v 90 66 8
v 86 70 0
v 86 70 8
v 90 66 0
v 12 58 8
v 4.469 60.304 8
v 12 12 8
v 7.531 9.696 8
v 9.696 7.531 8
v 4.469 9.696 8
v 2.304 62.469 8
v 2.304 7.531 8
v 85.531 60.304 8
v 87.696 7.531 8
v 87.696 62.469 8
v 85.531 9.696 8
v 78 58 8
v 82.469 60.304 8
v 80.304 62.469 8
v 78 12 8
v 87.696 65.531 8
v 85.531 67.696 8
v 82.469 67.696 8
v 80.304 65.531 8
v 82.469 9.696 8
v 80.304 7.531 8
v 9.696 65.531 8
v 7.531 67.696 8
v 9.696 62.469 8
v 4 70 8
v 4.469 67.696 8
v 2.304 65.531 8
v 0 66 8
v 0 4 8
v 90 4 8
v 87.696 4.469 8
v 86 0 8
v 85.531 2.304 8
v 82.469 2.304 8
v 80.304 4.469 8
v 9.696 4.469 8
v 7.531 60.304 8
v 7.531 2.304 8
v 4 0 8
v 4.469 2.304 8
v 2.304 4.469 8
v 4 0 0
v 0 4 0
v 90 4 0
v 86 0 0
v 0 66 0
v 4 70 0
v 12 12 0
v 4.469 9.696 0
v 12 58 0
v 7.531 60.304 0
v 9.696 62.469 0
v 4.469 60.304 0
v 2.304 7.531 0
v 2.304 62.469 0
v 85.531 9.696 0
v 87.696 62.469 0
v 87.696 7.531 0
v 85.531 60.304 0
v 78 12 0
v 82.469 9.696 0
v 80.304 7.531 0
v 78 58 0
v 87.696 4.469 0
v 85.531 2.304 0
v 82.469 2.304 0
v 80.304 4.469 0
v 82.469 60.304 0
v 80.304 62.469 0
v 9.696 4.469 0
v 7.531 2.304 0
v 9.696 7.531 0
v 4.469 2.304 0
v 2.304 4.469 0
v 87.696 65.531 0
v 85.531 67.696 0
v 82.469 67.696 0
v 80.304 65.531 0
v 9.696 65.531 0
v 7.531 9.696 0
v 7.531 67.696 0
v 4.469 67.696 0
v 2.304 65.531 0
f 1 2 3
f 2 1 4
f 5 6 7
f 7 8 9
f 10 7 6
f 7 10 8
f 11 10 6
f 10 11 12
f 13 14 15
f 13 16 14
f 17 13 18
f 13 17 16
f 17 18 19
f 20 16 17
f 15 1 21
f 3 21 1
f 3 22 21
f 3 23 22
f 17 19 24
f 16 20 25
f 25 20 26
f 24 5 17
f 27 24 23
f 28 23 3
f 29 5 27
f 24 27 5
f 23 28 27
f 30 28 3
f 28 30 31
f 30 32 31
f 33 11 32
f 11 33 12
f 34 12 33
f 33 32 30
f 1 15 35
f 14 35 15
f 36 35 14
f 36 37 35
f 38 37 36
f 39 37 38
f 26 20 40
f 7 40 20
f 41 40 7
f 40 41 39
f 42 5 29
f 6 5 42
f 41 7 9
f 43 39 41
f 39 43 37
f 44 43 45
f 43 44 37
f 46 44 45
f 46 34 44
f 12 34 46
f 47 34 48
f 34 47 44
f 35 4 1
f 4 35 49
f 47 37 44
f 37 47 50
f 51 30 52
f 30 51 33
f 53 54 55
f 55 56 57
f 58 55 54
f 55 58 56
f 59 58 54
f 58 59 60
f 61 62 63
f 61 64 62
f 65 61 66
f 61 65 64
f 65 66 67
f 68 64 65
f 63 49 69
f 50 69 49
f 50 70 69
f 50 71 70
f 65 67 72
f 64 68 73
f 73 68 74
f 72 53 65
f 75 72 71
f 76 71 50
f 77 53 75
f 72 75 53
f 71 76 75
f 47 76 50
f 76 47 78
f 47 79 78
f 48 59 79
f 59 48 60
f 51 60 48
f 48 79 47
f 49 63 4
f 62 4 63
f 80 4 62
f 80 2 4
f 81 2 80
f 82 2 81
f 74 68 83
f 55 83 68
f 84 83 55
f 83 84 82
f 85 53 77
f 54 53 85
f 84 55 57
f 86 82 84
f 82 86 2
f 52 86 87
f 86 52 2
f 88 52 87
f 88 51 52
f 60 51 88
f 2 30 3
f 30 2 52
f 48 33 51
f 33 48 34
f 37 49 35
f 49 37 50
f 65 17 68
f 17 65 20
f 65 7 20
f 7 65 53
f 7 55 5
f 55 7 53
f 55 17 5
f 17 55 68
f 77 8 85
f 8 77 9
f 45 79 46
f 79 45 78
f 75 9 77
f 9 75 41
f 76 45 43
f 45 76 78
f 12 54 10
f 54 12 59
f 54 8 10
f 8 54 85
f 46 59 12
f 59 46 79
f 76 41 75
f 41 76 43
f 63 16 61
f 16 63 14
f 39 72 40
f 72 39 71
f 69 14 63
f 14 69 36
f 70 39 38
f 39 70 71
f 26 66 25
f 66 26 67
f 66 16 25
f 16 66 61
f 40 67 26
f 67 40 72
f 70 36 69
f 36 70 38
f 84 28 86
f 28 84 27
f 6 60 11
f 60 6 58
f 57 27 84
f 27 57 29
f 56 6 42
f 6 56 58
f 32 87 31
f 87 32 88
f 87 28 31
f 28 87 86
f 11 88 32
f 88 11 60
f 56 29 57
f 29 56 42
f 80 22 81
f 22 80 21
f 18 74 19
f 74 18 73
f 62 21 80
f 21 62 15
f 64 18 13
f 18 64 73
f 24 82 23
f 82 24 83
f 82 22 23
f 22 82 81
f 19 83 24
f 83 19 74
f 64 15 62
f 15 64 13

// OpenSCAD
$fn = 32;

// ----------------------------------------------------------------------
// Frame plate: 90 x 70 frame, 12 mm rails
// ----------------------------------------------------------------------

// --- parameters (mm) ---
plate_l = 90;             // plate length, X
plate_w = 70;             // plate width, Y
plate_t = 8;              // plate thickness, Z (extrusion height)
corner_c = 4;             // corner chamfer
frame_bar = 12;           // frame rail width
bolt_r = 4;               // corner bolt window radius
bolt_inset = 6;           // bolt centre inset from the edges
fit_tol = 0.02;           // declared fit tolerance (prompt contract)
free_tol = 0.2;           // declared free tolerance (prompt contract)

win_l = plate_l - 2 * frame_bar;  // window length
win_w = plate_w - 2 * frame_bar;  // window width
bolt_d = 2 * bolt_r;  // corner hole diameter

profile = [[4, 0], [86, 0], [90, 4], [90, 66], [86, 70], [4, 70], [0, 66], [0, 4]];  // primary outline, 8 points, counter clockwise
void_1 = [[12, 12], [78, 12], [78, 58], [12, 58]];  // the window, 4 points
void_2 = [[9.696, 7.531], [7.531, 9.696], [4.469, 9.696], [2.304, 7.531], [2.304, 4.469], [4.469, 2.304], [7.531, 2.304], [9.696, 4.469]];  // corner bolt window, 8 points
void_3 = [[87.696, 7.531], [85.531, 9.696], [82.469, 9.696], [80.304, 7.531], [80.304, 4.469], [82.469, 2.304], [85.531, 2.304], [87.696, 4.469]];  // corner bolt window, 8 points
void_4 = [[9.696, 65.531], [7.531, 67.696], [4.469, 67.696], [2.304, 65.531], [2.304, 62.469], [4.469, 60.304], [7.531, 60.304], [9.696, 62.469]];  // corner bolt window, 8 points
void_5 = [[87.696, 65.531], [85.531, 67.696], [82.469, 67.696], [80.304, 65.531], [80.304, 62.469], [82.469, 60.304], [85.531, 60.304], [87.696, 62.469]];  // corner bolt window, 8 points

// --- the one profile operation ---
difference() {
  linear_extrude(height = plate_t) polygon(points = profile);
  translate([0, 0, -1])
    linear_extrude(height = plate_t + 2) polygon(points = void_1);
  translate([0, 0, -1])
    linear_extrude(height = plate_t + 2) polygon(points = void_2);
  translate([0, 0, -1])
    linear_extrude(height = plate_t + 2) polygon(points = void_3);
  translate([0, 0, -1])
    linear_extrude(height = plate_t + 2) polygon(points = void_4);
  translate([0, 0, -1])
    linear_extrude(height = plate_t + 2) polygon(points = void_5);
}
